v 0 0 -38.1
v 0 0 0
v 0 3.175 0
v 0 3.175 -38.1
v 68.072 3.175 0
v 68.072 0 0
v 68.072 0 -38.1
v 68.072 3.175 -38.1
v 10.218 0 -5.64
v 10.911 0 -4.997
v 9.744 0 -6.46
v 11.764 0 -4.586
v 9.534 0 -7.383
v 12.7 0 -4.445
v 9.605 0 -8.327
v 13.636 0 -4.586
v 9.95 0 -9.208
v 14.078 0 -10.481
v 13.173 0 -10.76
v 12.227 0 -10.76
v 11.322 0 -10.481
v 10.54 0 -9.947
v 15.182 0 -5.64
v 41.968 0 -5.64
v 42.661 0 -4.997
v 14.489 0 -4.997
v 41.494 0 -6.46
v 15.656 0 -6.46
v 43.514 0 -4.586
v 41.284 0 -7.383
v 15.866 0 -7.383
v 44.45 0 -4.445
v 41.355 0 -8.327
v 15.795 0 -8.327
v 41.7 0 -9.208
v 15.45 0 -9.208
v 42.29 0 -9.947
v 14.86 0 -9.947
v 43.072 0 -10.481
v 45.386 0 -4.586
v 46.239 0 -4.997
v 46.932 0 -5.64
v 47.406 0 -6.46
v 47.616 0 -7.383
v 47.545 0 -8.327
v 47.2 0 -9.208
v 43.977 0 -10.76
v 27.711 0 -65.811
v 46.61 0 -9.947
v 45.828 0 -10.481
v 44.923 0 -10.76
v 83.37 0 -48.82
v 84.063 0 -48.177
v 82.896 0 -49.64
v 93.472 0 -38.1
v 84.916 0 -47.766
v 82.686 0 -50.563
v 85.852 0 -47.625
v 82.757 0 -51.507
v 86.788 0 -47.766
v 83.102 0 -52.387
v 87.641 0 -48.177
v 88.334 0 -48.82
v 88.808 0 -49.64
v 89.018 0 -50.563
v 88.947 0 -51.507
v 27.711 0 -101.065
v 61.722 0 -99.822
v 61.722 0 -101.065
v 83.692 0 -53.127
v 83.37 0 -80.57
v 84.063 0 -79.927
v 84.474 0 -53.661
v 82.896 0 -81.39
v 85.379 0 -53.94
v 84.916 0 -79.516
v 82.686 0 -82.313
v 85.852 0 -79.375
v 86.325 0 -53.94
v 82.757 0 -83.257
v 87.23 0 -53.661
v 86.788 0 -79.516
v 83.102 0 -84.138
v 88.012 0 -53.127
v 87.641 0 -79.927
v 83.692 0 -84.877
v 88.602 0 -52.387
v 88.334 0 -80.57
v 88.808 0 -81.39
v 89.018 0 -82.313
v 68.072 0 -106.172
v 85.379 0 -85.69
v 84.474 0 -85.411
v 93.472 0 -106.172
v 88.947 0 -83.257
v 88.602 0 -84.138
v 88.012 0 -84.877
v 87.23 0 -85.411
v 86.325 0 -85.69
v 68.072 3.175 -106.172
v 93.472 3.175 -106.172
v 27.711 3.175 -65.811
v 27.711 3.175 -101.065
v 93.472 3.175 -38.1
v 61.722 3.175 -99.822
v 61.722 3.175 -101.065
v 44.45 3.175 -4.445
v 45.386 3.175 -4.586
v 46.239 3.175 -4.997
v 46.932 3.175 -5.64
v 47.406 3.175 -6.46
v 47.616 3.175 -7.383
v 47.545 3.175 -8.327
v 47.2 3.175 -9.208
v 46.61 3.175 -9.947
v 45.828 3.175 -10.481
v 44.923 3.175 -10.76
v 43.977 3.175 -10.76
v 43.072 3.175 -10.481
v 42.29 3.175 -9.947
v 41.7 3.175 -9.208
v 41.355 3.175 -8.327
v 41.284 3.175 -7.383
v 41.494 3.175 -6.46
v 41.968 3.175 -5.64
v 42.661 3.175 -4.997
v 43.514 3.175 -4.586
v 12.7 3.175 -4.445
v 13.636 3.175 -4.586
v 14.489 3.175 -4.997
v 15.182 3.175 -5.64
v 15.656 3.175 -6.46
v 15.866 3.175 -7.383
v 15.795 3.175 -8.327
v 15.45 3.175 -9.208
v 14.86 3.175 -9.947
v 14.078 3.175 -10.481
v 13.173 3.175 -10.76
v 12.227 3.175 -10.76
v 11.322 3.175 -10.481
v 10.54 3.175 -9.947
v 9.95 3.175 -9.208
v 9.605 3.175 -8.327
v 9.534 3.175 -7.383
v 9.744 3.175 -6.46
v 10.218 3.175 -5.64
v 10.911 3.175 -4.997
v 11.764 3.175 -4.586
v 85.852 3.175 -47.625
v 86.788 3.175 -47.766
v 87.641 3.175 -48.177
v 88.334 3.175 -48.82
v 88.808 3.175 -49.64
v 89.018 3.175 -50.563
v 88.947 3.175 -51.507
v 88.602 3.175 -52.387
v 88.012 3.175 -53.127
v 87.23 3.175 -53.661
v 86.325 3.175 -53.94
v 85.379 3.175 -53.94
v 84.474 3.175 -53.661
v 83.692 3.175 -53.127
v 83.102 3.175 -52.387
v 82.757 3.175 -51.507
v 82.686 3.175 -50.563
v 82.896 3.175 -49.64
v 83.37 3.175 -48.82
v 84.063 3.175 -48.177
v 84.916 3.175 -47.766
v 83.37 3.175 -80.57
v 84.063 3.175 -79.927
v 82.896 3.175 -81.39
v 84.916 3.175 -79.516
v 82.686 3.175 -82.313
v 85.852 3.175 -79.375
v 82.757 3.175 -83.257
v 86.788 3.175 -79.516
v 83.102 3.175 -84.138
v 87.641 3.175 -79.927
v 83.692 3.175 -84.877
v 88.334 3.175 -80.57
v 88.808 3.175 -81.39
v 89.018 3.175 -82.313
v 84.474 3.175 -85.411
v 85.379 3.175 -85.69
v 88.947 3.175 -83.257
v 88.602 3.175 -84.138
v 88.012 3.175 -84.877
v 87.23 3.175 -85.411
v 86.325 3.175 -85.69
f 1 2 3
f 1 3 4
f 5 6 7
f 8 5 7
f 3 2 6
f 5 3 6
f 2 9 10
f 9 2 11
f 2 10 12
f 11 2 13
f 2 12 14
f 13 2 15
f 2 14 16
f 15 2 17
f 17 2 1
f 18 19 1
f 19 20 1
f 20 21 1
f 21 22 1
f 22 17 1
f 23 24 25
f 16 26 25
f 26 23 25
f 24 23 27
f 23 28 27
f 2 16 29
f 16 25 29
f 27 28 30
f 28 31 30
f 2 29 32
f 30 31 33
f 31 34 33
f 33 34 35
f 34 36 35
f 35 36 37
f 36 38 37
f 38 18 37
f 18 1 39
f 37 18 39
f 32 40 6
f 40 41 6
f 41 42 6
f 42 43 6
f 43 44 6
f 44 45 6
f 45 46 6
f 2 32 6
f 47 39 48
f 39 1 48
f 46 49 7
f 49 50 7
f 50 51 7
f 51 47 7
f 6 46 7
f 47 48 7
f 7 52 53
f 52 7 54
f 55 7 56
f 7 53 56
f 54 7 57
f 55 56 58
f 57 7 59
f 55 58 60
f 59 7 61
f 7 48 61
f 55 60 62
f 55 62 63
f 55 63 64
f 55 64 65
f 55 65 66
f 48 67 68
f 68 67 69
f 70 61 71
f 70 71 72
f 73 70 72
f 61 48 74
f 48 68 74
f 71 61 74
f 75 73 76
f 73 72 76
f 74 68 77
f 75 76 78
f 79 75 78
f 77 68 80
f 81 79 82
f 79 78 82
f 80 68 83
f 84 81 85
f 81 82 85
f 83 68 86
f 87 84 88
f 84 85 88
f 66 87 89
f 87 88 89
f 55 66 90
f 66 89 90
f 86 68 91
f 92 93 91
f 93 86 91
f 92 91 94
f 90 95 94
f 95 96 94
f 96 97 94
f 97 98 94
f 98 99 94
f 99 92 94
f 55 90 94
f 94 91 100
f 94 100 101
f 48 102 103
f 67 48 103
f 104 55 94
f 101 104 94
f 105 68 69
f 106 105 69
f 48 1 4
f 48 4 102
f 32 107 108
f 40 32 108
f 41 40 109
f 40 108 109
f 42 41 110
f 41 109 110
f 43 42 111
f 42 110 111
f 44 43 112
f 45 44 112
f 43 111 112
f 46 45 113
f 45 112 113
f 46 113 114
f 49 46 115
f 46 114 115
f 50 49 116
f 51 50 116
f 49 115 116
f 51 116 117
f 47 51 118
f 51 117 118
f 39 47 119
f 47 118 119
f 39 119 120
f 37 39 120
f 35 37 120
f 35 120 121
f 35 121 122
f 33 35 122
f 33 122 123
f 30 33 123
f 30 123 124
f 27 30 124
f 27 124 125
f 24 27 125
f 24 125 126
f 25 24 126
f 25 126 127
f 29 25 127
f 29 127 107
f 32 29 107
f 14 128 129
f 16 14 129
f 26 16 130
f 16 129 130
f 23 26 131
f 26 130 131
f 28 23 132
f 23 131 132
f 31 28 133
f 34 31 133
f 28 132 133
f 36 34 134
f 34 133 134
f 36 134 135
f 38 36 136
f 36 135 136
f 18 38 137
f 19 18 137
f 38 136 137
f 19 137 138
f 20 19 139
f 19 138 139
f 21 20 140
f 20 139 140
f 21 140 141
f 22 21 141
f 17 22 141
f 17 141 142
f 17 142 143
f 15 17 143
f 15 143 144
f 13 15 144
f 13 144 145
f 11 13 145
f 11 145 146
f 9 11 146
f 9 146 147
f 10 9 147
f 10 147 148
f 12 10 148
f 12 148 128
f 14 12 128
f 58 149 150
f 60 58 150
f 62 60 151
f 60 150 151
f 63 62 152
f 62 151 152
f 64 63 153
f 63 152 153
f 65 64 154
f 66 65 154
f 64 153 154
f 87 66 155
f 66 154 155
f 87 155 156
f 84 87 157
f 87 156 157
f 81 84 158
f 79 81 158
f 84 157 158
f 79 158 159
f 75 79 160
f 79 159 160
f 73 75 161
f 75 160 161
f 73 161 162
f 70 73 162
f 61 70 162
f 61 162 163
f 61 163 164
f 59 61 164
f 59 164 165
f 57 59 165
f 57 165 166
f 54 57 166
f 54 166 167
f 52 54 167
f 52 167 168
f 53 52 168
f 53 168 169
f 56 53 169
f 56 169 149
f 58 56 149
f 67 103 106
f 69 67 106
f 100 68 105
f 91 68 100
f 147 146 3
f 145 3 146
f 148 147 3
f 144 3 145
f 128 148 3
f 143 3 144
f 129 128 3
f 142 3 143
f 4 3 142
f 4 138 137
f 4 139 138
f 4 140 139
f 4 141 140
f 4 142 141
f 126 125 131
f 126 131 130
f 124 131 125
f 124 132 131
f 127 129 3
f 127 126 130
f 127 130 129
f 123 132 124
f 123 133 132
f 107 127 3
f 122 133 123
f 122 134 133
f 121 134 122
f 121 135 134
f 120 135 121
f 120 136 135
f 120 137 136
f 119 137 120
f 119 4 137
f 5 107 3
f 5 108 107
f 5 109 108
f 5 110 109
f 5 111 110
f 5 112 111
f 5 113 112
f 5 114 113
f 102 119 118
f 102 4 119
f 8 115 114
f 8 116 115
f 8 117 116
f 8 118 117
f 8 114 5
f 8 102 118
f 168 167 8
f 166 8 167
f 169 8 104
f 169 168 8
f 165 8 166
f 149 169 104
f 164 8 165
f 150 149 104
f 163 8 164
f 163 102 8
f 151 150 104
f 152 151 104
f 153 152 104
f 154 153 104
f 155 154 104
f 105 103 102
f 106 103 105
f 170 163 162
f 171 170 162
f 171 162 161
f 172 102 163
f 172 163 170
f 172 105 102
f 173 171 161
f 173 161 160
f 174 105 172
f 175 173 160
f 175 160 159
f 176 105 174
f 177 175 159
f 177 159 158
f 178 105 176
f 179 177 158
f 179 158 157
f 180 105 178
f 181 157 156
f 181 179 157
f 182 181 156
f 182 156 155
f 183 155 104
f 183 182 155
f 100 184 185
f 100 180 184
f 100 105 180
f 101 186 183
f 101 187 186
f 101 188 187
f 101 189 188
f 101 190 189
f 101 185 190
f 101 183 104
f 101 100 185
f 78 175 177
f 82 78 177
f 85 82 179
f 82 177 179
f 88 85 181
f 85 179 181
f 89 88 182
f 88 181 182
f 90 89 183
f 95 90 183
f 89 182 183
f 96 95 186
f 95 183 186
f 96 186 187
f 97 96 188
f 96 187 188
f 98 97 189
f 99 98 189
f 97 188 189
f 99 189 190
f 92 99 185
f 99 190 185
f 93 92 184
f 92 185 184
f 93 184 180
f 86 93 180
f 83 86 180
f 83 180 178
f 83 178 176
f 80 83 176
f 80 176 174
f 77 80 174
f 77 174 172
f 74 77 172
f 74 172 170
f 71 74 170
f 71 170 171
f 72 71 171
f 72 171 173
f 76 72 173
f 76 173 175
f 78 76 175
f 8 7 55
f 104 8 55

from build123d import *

# Parameters (mm, degrees)
SKETCH1_W           = 68.072
SKETCH1_H           = 38.1
SKETCH1_W_2         = 25.4
SKETCH1_H_2         = 68.072
BOSS_EXTRUDE1_DEPTH = 3.175
SKETCH2_R           = 3.175
CUT_EXTRUDE1_DEPTH  = 142.490596836
SKETCH3_W           = 34.0106
SKETCH3_H           = 54.542014323
BOSS_EXTRUDE2_DEPTH = 3.175


with BuildPart() as part:
    # Sketch1 → Boss-Extrude1 (new body)
    with BuildSketch(Plane(origin=(0, 0, 0), x_dir=(1, 0, 0), z_dir=(0, 1, 0))):
        with Locations((34.036, 19.05)):
            Rectangle(SKETCH1_W, SKETCH1_H)
        Polygon((68.072, 106.172), (68.072, 38.1), (0, 38.1), align=None)
        with Locations((80.772, 72.136)):
            Rectangle(SKETCH1_W_2, SKETCH1_H_2)
    extrude(amount=BOSS_EXTRUDE1_DEPTH)

    # Sketch2 → Cut-Extrude1 (cut, through all)
    with BuildSketch(Plane(origin=(0, 3.175, 0), x_dir=(1, 0, 0), z_dir=(0, 1, 0))):
        with Locations(Location((12.7, 7.62, 0), (0, 0, 270))):
            Circle(SKETCH2_R)
        with Locations(Location((44.45, 7.62, 0), (0, 0, 270))):
            Circle(SKETCH2_R)
        with Locations(Location((85.852, 50.8, 0), (0, 0, 270))):
            Circle(SKETCH2_R)
        with Locations(Location((85.852, 82.55, 0), (0, 0, 270))):
            Circle(SKETCH2_R)
    extrude(amount=-CUT_EXTRUDE1_DEPTH, mode=Mode.SUBTRACT)

    # Sketch3 → Boss-Extrude2 (add)
    with BuildSketch(Plane(origin=(0, 3.175, 0), x_dir=(1, 0, 0), z_dir=(0, 1, 0))):
        with Locations((44.7167, 73.793637407)):
            Rectangle(SKETCH3_W, SKETCH3_H)
    extrude(amount=-BOSS_EXTRUDE2_DEPTH)


solid = part.part
